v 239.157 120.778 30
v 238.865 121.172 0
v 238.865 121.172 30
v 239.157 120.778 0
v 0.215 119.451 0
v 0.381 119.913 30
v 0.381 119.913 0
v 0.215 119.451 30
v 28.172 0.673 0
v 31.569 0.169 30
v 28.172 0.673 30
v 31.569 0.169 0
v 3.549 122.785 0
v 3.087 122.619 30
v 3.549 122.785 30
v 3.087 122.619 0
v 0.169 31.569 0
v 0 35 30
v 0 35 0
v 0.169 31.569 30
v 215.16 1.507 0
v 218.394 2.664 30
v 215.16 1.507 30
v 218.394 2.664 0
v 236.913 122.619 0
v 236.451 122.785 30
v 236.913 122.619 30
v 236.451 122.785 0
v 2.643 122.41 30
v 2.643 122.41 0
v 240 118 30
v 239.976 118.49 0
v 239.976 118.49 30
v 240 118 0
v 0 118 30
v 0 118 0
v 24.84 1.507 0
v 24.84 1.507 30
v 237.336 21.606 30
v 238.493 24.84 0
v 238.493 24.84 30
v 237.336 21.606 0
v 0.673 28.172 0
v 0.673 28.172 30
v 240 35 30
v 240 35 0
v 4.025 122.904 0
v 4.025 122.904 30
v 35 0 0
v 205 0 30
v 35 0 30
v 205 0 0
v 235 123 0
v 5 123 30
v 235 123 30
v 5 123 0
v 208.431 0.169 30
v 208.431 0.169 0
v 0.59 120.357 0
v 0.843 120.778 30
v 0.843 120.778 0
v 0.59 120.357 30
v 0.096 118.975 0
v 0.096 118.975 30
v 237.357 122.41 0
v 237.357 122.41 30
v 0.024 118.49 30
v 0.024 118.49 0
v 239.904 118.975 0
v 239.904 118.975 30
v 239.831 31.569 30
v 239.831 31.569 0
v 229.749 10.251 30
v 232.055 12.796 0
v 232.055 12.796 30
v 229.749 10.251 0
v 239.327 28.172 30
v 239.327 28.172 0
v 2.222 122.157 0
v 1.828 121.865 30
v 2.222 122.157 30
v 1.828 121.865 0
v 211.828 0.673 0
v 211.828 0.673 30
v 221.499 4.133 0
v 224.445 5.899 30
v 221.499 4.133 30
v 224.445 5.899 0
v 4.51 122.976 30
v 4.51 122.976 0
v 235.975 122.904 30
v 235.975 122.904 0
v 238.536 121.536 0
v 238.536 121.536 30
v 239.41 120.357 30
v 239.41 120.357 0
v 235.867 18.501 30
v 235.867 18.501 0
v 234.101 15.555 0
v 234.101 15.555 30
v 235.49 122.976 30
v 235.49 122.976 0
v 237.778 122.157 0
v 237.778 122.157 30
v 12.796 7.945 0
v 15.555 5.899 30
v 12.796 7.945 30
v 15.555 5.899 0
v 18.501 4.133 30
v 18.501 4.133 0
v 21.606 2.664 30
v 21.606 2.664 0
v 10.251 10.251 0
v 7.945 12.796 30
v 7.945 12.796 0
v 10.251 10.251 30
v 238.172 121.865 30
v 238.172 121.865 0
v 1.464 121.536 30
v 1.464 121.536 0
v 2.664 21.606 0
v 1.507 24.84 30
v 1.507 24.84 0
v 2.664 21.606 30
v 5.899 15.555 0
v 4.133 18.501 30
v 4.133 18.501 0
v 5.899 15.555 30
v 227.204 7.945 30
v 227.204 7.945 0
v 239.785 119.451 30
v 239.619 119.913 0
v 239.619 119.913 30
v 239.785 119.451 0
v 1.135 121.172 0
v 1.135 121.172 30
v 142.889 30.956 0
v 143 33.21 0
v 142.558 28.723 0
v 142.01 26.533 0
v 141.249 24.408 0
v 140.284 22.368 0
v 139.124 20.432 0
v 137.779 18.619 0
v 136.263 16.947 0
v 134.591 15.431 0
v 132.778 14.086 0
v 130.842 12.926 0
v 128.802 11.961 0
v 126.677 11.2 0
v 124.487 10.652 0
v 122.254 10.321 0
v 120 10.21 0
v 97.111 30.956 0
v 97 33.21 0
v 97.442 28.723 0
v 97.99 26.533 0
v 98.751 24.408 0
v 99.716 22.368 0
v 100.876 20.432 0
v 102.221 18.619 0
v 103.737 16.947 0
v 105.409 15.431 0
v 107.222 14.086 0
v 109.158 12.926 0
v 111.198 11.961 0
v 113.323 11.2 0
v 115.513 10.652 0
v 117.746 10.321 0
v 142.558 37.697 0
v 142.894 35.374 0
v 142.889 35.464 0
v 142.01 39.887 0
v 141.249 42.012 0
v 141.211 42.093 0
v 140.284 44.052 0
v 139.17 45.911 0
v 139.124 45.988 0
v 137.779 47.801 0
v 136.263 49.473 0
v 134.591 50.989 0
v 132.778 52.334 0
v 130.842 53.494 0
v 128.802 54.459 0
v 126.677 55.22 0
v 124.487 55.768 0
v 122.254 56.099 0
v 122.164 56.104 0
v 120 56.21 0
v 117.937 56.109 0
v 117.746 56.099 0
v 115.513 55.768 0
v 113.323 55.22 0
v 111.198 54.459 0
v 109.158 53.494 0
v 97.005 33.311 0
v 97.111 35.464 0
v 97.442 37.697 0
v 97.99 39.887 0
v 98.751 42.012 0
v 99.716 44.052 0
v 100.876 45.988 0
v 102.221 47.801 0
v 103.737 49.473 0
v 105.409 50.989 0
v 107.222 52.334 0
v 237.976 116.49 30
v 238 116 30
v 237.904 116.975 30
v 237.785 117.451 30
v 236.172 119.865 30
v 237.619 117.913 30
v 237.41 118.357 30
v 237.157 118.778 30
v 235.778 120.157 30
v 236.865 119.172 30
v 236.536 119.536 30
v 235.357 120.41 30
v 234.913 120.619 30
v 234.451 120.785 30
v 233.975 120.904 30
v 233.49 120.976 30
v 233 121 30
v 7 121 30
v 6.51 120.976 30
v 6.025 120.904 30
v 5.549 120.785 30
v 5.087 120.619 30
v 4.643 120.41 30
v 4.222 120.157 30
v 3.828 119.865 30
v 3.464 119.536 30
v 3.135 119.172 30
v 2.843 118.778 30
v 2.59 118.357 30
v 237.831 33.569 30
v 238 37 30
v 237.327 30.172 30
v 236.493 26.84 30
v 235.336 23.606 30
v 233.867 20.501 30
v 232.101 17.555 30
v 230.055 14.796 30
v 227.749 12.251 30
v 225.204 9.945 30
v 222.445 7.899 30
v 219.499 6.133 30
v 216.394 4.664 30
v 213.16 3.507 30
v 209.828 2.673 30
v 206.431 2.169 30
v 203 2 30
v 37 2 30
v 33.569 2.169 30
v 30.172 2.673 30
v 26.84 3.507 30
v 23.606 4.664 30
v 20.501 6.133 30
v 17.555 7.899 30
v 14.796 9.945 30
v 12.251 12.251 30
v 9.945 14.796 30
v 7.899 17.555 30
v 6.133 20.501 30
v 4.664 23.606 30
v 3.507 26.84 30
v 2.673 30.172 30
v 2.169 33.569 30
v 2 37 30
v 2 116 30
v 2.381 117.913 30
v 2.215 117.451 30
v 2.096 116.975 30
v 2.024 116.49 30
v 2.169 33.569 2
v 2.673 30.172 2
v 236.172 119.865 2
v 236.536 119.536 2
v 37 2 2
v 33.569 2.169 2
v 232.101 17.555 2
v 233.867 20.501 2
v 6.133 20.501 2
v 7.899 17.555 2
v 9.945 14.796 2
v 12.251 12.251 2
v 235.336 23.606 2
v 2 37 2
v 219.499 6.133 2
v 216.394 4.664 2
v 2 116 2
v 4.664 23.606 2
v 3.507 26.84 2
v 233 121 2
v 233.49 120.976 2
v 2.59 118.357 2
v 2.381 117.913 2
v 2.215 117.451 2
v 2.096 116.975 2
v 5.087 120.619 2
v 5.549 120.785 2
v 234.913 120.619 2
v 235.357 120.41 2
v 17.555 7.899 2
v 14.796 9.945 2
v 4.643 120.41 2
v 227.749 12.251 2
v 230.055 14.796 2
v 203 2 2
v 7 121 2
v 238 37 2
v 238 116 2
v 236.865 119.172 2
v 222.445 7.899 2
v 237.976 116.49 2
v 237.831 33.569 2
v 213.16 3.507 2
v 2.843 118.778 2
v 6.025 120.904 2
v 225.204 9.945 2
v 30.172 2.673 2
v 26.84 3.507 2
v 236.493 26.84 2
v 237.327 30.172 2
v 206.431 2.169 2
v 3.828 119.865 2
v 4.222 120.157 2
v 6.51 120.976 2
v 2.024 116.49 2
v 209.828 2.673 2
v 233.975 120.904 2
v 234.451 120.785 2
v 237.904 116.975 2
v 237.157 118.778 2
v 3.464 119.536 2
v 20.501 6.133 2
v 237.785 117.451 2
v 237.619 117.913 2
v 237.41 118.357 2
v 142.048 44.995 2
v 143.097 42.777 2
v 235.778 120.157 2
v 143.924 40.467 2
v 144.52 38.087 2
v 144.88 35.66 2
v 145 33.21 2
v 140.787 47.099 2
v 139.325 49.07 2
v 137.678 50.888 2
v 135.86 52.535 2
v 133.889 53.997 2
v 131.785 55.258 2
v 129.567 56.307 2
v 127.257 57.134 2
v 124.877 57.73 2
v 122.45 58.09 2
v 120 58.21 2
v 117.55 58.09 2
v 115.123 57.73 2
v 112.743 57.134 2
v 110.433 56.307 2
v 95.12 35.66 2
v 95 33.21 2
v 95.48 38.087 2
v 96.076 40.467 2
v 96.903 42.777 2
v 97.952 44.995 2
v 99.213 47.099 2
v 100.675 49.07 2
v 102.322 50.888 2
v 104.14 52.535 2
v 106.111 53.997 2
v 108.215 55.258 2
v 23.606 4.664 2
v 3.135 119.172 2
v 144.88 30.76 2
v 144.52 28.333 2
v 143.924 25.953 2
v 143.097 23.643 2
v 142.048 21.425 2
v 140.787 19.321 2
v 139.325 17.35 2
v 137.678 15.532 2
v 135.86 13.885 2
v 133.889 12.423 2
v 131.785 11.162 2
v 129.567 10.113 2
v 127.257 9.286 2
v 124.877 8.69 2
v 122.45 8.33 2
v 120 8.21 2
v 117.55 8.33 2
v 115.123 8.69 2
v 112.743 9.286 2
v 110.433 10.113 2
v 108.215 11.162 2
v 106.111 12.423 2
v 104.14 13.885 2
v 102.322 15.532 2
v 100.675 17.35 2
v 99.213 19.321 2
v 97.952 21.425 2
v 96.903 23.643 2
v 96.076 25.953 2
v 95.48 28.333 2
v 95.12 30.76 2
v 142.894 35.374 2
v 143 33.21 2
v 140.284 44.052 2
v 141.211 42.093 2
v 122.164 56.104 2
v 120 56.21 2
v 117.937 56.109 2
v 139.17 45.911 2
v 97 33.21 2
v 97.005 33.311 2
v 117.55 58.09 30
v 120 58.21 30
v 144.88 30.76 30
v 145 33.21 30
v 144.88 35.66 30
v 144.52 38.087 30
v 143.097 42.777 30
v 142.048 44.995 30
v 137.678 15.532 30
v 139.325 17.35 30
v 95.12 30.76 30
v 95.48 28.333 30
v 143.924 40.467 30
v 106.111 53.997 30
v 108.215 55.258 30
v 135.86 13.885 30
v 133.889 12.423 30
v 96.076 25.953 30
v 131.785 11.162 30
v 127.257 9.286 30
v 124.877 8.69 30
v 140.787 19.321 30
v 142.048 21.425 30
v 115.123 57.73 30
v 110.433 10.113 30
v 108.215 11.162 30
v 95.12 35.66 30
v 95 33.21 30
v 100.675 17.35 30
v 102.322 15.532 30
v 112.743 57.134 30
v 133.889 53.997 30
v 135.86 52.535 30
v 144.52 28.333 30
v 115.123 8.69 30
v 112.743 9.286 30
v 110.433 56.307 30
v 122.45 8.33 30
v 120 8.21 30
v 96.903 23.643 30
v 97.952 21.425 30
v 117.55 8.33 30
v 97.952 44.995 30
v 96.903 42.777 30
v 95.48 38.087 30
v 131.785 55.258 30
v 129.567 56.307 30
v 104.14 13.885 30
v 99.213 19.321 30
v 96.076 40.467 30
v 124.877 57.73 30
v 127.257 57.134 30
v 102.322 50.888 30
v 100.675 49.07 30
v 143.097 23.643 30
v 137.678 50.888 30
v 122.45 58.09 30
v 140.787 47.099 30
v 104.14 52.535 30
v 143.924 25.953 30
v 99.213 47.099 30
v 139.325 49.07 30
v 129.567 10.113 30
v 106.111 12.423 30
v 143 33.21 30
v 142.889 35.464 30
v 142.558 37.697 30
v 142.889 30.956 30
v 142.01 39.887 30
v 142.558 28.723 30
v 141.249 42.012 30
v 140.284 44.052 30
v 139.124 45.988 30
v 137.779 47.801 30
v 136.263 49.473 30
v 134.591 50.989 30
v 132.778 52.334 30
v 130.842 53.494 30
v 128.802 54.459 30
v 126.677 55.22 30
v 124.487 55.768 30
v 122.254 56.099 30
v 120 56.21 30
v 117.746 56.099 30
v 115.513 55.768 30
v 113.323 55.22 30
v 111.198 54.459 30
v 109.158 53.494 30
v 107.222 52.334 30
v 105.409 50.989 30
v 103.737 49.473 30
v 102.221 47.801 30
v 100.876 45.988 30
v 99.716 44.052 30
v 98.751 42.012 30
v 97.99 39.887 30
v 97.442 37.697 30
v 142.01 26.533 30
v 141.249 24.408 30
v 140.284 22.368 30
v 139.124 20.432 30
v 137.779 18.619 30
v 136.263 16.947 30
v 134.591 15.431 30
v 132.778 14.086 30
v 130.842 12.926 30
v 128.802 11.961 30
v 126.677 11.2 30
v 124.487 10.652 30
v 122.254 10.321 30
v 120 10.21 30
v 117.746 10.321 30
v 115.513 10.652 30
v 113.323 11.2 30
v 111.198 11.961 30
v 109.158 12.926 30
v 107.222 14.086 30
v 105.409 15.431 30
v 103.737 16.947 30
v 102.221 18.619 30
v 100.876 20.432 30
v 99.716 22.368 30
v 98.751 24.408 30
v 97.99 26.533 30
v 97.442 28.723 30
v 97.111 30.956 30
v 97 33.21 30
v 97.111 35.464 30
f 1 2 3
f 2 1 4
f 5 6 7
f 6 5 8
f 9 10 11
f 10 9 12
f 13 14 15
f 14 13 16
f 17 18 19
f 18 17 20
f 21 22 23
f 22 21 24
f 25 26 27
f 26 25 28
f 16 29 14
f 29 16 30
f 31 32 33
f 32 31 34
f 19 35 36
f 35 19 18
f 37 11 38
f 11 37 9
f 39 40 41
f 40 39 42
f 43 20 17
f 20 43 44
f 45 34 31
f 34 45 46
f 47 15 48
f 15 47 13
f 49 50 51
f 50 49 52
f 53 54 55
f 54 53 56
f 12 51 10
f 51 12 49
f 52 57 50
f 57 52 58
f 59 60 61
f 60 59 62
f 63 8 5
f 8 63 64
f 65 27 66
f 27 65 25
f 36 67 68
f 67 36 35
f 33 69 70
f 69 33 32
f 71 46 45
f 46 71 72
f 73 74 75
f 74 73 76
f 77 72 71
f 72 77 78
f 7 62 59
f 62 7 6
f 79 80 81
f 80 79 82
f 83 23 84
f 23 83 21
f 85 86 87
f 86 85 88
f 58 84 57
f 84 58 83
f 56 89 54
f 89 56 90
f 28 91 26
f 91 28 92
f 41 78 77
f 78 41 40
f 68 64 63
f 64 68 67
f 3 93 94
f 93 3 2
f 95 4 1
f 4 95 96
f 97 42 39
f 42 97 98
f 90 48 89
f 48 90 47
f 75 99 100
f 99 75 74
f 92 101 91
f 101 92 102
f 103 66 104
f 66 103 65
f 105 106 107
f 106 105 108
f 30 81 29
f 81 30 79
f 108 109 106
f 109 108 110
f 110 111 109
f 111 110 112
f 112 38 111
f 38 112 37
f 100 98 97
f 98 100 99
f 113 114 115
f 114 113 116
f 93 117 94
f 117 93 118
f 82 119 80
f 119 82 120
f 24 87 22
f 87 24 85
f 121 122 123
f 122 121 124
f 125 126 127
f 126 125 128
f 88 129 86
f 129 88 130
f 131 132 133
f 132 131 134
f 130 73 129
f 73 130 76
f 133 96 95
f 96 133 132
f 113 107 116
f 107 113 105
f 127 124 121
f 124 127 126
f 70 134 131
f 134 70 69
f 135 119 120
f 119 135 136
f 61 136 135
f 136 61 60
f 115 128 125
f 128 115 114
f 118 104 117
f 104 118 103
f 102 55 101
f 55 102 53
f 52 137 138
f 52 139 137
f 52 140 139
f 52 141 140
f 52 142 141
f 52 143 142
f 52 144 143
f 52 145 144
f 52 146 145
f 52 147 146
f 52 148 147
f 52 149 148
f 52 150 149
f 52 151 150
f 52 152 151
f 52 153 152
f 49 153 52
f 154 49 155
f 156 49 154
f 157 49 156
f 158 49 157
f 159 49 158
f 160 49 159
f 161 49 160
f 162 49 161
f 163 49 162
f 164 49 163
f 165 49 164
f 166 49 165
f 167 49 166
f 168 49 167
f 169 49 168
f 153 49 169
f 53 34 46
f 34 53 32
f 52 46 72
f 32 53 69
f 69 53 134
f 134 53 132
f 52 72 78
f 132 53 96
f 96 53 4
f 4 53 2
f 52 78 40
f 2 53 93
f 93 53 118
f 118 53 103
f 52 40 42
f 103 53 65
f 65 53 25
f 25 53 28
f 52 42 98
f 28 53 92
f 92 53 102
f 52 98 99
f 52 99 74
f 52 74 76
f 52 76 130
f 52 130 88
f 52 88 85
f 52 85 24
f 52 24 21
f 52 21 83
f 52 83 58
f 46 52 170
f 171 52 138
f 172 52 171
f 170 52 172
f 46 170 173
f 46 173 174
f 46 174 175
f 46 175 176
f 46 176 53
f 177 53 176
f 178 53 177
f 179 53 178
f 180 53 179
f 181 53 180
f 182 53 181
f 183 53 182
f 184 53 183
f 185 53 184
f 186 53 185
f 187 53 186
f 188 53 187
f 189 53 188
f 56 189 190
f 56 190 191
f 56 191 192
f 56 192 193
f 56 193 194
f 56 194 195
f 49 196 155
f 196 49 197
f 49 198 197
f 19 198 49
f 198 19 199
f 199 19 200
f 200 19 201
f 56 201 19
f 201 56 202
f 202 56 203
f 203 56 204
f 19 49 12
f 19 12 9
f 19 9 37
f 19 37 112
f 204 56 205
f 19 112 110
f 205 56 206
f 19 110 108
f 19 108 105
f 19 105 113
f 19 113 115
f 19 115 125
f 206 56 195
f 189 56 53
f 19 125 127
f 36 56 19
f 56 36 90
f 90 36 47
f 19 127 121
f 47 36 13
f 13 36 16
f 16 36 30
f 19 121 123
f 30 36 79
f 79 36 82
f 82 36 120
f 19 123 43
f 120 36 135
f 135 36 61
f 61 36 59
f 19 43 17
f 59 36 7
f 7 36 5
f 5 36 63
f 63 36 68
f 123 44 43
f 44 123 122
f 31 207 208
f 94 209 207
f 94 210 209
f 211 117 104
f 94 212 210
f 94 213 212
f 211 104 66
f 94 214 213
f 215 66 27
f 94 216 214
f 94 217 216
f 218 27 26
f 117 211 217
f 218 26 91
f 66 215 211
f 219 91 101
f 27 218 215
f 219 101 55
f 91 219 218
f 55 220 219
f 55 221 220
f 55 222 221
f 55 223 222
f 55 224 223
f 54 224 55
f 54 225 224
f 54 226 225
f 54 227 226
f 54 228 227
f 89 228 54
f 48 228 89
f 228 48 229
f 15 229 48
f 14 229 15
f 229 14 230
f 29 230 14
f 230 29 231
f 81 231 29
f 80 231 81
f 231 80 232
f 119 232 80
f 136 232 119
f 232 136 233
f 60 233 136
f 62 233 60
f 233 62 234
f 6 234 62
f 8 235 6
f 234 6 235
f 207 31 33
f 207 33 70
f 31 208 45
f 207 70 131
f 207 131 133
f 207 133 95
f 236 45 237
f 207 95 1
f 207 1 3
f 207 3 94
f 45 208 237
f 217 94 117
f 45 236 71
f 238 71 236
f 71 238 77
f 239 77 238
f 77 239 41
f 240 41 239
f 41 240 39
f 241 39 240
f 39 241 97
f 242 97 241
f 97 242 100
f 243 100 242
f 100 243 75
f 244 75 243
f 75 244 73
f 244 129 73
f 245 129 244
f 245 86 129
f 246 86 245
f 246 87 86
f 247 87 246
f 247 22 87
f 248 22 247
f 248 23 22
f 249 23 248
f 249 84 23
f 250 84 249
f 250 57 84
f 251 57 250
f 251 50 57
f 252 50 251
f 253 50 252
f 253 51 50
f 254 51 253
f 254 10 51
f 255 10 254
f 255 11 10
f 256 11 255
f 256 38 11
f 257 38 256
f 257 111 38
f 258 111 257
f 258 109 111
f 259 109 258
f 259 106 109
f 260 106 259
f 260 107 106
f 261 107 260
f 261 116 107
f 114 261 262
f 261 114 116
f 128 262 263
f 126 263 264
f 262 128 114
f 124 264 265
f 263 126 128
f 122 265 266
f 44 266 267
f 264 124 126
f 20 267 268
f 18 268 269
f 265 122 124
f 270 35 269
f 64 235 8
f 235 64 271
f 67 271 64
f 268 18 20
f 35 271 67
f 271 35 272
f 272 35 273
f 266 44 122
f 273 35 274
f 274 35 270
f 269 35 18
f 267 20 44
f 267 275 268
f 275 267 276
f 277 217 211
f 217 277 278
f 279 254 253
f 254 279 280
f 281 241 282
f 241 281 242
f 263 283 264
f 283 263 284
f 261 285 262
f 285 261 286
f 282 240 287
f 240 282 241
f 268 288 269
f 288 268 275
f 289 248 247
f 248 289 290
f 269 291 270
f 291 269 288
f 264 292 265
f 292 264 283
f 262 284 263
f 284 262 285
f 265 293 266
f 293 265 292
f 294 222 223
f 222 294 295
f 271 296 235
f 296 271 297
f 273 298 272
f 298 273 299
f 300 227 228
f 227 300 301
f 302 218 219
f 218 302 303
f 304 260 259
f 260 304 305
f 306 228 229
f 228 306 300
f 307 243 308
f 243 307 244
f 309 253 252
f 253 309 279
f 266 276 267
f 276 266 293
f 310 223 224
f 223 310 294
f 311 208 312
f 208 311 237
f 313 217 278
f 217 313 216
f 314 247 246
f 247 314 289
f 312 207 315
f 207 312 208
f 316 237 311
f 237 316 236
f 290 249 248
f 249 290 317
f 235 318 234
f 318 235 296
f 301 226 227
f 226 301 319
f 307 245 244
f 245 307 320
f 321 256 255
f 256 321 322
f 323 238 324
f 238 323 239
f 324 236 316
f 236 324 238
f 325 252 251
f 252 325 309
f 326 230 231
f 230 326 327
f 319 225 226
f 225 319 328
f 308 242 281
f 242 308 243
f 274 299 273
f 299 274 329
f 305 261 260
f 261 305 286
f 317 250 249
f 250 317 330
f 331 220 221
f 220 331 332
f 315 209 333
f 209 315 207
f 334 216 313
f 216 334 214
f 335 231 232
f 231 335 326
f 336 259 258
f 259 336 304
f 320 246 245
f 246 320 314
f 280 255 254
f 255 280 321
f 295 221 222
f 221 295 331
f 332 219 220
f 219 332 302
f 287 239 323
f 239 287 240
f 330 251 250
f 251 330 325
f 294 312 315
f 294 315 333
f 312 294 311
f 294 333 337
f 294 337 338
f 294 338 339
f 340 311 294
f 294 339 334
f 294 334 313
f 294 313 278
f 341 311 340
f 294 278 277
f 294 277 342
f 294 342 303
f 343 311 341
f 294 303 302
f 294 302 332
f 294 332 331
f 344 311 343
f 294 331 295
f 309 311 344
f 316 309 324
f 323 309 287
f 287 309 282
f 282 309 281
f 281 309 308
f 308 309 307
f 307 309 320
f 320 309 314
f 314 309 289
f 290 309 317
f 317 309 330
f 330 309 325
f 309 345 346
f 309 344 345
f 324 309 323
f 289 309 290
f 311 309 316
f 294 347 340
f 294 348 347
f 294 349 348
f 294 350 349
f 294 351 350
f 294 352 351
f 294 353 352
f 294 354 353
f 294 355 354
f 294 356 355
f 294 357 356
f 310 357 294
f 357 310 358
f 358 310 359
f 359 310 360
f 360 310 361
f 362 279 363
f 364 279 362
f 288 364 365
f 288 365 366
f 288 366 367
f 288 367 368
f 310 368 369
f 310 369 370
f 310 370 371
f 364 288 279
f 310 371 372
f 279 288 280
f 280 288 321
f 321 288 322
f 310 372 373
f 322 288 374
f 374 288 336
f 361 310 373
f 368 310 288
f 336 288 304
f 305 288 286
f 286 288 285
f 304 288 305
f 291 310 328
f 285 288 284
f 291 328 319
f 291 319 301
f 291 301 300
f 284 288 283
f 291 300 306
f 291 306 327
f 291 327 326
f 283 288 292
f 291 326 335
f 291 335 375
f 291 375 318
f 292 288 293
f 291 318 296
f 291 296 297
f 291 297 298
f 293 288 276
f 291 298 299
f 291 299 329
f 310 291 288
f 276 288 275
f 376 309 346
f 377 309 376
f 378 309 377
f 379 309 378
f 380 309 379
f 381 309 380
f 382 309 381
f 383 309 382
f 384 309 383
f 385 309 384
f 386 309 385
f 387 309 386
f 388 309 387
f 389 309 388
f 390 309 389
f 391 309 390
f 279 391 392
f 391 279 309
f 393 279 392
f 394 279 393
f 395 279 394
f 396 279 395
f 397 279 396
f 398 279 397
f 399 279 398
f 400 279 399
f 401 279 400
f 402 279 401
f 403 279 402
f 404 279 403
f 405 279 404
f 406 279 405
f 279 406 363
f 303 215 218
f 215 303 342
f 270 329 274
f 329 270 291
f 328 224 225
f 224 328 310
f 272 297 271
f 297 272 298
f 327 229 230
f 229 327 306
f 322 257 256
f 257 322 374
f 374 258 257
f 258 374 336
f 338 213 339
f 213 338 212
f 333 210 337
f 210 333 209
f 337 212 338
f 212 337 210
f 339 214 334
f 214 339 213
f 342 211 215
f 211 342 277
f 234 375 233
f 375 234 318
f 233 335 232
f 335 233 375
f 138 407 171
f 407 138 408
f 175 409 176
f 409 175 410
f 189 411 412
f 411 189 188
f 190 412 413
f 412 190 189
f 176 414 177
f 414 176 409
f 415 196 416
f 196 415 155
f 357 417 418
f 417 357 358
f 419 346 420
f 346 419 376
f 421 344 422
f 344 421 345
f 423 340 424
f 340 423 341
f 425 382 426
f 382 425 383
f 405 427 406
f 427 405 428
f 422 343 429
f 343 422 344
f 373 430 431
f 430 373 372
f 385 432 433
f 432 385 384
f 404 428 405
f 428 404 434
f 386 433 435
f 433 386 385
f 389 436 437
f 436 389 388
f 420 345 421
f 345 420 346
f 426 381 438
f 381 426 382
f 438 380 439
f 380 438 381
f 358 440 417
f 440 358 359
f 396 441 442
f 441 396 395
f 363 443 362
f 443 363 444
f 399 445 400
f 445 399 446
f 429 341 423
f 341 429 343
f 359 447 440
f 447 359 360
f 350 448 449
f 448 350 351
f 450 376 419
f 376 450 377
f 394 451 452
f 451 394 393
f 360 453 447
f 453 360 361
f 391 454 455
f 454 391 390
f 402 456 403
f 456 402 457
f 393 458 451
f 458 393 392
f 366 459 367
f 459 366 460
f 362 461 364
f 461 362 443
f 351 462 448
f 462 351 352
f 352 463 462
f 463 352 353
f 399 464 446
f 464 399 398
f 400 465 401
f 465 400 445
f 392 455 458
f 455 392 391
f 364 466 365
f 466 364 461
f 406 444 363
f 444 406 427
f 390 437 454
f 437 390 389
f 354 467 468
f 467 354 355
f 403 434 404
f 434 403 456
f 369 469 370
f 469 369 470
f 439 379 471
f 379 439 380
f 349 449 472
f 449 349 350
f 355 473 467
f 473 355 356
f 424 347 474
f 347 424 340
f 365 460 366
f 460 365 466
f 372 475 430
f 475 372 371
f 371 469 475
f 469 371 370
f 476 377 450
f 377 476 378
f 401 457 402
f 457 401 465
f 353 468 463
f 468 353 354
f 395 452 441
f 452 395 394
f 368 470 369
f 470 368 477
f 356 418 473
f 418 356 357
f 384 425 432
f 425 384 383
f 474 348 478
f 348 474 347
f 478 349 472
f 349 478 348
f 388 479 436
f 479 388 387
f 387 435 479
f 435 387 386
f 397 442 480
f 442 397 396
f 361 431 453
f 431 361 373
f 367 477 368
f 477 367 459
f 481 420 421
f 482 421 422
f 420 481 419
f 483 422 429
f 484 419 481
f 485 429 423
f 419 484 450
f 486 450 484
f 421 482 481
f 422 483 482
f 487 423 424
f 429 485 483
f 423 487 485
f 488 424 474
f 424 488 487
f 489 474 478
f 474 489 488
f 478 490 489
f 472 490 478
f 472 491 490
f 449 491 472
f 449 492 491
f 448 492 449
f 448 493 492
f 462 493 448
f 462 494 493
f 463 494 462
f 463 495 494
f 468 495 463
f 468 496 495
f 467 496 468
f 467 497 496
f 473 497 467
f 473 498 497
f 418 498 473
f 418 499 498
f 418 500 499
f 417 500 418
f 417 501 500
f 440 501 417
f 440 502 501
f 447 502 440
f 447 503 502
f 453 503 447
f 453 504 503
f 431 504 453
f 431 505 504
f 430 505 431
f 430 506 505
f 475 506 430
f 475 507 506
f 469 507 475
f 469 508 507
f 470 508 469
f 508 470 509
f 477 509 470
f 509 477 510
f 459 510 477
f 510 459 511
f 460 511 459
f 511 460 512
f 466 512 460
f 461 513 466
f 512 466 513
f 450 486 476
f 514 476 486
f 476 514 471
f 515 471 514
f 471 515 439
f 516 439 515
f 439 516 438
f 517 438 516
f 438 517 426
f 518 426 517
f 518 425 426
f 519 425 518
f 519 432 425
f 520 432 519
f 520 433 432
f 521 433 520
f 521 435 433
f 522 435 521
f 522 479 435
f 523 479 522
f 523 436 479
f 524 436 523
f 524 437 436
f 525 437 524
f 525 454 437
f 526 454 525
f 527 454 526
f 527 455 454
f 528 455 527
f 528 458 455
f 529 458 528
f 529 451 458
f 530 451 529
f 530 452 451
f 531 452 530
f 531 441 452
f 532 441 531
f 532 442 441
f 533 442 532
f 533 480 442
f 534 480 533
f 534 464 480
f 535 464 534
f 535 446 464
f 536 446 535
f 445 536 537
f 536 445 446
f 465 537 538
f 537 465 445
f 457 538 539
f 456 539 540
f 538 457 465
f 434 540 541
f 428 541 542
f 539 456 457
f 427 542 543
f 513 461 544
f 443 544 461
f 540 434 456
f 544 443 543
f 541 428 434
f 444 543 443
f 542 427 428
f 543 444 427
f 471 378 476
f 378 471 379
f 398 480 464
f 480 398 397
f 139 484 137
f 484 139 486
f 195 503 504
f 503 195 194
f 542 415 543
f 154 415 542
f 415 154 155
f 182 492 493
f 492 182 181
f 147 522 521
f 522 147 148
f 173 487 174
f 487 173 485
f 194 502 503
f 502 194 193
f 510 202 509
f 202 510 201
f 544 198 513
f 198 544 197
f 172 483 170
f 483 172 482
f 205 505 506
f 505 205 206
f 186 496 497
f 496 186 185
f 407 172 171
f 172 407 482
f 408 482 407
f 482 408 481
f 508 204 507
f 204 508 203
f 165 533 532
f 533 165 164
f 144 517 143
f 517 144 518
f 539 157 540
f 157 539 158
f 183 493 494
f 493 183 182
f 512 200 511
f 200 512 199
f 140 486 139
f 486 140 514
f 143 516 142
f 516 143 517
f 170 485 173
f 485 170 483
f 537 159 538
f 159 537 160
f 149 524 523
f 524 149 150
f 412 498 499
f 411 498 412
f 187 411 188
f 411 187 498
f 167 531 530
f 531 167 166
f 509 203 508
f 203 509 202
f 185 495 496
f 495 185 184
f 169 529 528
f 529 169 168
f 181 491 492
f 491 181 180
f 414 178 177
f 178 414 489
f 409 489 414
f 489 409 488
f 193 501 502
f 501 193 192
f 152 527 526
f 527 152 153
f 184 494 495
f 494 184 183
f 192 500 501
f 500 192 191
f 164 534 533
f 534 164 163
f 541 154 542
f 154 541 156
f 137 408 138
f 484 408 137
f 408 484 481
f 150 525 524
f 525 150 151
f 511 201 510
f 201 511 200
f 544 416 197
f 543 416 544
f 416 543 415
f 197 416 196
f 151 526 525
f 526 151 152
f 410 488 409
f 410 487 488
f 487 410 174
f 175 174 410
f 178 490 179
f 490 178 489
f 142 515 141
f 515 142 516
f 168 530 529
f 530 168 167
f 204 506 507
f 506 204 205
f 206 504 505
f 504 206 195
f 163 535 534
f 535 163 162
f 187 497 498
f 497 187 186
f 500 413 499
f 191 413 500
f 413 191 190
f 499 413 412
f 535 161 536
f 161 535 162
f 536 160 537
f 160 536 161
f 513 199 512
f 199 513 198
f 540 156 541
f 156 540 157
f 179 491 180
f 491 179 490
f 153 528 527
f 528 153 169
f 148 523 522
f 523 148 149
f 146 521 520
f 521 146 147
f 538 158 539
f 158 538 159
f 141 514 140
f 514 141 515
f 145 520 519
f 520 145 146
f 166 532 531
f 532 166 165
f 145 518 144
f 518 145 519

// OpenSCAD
$fn=64;

width = 240;
depth = 123;
height = 30;
plastic_thickness = 2;
tube_thickness = 46;
round_rad_big=35;
round_rad_small=5;

union() {
    difference() {
        hull() {
            translate([round_rad_big,round_rad_big,0])
                cylinder(r=round_rad_big,h=height);
            translate([width-round_rad_big,round_rad_big,0])
                cylinder(r=round_rad_big,h=height);
            translate([round_rad_small,depth-round_rad_small,0])
                cylinder(r=round_rad_small,h=height);
            translate([width-round_rad_small,depth-round_rad_small,0])
                cylinder(r=round_rad_small,h=height);
        }
        hull() {
            translate([round_rad_big+plastic_thickness,round_rad_big+plastic_thickness,plastic_thickness])
                cylinder(r=round_rad_big,h=height);
            translate([width-round_rad_big-plastic_thickness,round_rad_big+plastic_thickness,plastic_thickness])
                cylinder(r=round_rad_big,h=height);
            translate([round_rad_small+plastic_thickness,depth-round_rad_small-plastic_thickness,plastic_thickness])
                cylinder(r=round_rad_small,h=height);
            translate([width-round_rad_small-plastic_thickness,depth-round_rad_small-plastic_thickness,plastic_thickness])
                cylinder(r=round_rad_small,h=height);
        }
        translate([width/2,depth*.27,0])
            cylinder(d=tube_thickness,h=plastic_thickness);
    }
    translate([width/2,depth*.27,0]) {
        difference() {
            cylinder(d=(tube_thickness+plastic_thickness*2), h=height);
            cylinder(d=tube_thickness, h=height);
        }
    }
}
/*
module skrufeste() {
    translate([0,depth/4,0])
        cylinder(d=width/2,h=height);
}*/

module roundedRect(size, radius)
{
	x = size[0];
	y = size[1];
	z = size[2];

	linear_extrude(height=z)
	hull()
	{
		// place 4 circles in the corners, with the given radius
		translate([(-x/2)+(radius/2), (-y/2)+(radius/2), 0])
		circle(r=radius);
	
		translate([(x/2)-(radius/2), (-y/2)+(radius/2), 0])
		circle(r=radius);
	
		translate([(-x/2)+(radius/2), (y/2)-(radius/2), 0])
		circle(r=radius);
	
		translate([(x/2)-(radius/2), (y/2)-(radius/2), 0])
		circle(r=radius);
	}
}
